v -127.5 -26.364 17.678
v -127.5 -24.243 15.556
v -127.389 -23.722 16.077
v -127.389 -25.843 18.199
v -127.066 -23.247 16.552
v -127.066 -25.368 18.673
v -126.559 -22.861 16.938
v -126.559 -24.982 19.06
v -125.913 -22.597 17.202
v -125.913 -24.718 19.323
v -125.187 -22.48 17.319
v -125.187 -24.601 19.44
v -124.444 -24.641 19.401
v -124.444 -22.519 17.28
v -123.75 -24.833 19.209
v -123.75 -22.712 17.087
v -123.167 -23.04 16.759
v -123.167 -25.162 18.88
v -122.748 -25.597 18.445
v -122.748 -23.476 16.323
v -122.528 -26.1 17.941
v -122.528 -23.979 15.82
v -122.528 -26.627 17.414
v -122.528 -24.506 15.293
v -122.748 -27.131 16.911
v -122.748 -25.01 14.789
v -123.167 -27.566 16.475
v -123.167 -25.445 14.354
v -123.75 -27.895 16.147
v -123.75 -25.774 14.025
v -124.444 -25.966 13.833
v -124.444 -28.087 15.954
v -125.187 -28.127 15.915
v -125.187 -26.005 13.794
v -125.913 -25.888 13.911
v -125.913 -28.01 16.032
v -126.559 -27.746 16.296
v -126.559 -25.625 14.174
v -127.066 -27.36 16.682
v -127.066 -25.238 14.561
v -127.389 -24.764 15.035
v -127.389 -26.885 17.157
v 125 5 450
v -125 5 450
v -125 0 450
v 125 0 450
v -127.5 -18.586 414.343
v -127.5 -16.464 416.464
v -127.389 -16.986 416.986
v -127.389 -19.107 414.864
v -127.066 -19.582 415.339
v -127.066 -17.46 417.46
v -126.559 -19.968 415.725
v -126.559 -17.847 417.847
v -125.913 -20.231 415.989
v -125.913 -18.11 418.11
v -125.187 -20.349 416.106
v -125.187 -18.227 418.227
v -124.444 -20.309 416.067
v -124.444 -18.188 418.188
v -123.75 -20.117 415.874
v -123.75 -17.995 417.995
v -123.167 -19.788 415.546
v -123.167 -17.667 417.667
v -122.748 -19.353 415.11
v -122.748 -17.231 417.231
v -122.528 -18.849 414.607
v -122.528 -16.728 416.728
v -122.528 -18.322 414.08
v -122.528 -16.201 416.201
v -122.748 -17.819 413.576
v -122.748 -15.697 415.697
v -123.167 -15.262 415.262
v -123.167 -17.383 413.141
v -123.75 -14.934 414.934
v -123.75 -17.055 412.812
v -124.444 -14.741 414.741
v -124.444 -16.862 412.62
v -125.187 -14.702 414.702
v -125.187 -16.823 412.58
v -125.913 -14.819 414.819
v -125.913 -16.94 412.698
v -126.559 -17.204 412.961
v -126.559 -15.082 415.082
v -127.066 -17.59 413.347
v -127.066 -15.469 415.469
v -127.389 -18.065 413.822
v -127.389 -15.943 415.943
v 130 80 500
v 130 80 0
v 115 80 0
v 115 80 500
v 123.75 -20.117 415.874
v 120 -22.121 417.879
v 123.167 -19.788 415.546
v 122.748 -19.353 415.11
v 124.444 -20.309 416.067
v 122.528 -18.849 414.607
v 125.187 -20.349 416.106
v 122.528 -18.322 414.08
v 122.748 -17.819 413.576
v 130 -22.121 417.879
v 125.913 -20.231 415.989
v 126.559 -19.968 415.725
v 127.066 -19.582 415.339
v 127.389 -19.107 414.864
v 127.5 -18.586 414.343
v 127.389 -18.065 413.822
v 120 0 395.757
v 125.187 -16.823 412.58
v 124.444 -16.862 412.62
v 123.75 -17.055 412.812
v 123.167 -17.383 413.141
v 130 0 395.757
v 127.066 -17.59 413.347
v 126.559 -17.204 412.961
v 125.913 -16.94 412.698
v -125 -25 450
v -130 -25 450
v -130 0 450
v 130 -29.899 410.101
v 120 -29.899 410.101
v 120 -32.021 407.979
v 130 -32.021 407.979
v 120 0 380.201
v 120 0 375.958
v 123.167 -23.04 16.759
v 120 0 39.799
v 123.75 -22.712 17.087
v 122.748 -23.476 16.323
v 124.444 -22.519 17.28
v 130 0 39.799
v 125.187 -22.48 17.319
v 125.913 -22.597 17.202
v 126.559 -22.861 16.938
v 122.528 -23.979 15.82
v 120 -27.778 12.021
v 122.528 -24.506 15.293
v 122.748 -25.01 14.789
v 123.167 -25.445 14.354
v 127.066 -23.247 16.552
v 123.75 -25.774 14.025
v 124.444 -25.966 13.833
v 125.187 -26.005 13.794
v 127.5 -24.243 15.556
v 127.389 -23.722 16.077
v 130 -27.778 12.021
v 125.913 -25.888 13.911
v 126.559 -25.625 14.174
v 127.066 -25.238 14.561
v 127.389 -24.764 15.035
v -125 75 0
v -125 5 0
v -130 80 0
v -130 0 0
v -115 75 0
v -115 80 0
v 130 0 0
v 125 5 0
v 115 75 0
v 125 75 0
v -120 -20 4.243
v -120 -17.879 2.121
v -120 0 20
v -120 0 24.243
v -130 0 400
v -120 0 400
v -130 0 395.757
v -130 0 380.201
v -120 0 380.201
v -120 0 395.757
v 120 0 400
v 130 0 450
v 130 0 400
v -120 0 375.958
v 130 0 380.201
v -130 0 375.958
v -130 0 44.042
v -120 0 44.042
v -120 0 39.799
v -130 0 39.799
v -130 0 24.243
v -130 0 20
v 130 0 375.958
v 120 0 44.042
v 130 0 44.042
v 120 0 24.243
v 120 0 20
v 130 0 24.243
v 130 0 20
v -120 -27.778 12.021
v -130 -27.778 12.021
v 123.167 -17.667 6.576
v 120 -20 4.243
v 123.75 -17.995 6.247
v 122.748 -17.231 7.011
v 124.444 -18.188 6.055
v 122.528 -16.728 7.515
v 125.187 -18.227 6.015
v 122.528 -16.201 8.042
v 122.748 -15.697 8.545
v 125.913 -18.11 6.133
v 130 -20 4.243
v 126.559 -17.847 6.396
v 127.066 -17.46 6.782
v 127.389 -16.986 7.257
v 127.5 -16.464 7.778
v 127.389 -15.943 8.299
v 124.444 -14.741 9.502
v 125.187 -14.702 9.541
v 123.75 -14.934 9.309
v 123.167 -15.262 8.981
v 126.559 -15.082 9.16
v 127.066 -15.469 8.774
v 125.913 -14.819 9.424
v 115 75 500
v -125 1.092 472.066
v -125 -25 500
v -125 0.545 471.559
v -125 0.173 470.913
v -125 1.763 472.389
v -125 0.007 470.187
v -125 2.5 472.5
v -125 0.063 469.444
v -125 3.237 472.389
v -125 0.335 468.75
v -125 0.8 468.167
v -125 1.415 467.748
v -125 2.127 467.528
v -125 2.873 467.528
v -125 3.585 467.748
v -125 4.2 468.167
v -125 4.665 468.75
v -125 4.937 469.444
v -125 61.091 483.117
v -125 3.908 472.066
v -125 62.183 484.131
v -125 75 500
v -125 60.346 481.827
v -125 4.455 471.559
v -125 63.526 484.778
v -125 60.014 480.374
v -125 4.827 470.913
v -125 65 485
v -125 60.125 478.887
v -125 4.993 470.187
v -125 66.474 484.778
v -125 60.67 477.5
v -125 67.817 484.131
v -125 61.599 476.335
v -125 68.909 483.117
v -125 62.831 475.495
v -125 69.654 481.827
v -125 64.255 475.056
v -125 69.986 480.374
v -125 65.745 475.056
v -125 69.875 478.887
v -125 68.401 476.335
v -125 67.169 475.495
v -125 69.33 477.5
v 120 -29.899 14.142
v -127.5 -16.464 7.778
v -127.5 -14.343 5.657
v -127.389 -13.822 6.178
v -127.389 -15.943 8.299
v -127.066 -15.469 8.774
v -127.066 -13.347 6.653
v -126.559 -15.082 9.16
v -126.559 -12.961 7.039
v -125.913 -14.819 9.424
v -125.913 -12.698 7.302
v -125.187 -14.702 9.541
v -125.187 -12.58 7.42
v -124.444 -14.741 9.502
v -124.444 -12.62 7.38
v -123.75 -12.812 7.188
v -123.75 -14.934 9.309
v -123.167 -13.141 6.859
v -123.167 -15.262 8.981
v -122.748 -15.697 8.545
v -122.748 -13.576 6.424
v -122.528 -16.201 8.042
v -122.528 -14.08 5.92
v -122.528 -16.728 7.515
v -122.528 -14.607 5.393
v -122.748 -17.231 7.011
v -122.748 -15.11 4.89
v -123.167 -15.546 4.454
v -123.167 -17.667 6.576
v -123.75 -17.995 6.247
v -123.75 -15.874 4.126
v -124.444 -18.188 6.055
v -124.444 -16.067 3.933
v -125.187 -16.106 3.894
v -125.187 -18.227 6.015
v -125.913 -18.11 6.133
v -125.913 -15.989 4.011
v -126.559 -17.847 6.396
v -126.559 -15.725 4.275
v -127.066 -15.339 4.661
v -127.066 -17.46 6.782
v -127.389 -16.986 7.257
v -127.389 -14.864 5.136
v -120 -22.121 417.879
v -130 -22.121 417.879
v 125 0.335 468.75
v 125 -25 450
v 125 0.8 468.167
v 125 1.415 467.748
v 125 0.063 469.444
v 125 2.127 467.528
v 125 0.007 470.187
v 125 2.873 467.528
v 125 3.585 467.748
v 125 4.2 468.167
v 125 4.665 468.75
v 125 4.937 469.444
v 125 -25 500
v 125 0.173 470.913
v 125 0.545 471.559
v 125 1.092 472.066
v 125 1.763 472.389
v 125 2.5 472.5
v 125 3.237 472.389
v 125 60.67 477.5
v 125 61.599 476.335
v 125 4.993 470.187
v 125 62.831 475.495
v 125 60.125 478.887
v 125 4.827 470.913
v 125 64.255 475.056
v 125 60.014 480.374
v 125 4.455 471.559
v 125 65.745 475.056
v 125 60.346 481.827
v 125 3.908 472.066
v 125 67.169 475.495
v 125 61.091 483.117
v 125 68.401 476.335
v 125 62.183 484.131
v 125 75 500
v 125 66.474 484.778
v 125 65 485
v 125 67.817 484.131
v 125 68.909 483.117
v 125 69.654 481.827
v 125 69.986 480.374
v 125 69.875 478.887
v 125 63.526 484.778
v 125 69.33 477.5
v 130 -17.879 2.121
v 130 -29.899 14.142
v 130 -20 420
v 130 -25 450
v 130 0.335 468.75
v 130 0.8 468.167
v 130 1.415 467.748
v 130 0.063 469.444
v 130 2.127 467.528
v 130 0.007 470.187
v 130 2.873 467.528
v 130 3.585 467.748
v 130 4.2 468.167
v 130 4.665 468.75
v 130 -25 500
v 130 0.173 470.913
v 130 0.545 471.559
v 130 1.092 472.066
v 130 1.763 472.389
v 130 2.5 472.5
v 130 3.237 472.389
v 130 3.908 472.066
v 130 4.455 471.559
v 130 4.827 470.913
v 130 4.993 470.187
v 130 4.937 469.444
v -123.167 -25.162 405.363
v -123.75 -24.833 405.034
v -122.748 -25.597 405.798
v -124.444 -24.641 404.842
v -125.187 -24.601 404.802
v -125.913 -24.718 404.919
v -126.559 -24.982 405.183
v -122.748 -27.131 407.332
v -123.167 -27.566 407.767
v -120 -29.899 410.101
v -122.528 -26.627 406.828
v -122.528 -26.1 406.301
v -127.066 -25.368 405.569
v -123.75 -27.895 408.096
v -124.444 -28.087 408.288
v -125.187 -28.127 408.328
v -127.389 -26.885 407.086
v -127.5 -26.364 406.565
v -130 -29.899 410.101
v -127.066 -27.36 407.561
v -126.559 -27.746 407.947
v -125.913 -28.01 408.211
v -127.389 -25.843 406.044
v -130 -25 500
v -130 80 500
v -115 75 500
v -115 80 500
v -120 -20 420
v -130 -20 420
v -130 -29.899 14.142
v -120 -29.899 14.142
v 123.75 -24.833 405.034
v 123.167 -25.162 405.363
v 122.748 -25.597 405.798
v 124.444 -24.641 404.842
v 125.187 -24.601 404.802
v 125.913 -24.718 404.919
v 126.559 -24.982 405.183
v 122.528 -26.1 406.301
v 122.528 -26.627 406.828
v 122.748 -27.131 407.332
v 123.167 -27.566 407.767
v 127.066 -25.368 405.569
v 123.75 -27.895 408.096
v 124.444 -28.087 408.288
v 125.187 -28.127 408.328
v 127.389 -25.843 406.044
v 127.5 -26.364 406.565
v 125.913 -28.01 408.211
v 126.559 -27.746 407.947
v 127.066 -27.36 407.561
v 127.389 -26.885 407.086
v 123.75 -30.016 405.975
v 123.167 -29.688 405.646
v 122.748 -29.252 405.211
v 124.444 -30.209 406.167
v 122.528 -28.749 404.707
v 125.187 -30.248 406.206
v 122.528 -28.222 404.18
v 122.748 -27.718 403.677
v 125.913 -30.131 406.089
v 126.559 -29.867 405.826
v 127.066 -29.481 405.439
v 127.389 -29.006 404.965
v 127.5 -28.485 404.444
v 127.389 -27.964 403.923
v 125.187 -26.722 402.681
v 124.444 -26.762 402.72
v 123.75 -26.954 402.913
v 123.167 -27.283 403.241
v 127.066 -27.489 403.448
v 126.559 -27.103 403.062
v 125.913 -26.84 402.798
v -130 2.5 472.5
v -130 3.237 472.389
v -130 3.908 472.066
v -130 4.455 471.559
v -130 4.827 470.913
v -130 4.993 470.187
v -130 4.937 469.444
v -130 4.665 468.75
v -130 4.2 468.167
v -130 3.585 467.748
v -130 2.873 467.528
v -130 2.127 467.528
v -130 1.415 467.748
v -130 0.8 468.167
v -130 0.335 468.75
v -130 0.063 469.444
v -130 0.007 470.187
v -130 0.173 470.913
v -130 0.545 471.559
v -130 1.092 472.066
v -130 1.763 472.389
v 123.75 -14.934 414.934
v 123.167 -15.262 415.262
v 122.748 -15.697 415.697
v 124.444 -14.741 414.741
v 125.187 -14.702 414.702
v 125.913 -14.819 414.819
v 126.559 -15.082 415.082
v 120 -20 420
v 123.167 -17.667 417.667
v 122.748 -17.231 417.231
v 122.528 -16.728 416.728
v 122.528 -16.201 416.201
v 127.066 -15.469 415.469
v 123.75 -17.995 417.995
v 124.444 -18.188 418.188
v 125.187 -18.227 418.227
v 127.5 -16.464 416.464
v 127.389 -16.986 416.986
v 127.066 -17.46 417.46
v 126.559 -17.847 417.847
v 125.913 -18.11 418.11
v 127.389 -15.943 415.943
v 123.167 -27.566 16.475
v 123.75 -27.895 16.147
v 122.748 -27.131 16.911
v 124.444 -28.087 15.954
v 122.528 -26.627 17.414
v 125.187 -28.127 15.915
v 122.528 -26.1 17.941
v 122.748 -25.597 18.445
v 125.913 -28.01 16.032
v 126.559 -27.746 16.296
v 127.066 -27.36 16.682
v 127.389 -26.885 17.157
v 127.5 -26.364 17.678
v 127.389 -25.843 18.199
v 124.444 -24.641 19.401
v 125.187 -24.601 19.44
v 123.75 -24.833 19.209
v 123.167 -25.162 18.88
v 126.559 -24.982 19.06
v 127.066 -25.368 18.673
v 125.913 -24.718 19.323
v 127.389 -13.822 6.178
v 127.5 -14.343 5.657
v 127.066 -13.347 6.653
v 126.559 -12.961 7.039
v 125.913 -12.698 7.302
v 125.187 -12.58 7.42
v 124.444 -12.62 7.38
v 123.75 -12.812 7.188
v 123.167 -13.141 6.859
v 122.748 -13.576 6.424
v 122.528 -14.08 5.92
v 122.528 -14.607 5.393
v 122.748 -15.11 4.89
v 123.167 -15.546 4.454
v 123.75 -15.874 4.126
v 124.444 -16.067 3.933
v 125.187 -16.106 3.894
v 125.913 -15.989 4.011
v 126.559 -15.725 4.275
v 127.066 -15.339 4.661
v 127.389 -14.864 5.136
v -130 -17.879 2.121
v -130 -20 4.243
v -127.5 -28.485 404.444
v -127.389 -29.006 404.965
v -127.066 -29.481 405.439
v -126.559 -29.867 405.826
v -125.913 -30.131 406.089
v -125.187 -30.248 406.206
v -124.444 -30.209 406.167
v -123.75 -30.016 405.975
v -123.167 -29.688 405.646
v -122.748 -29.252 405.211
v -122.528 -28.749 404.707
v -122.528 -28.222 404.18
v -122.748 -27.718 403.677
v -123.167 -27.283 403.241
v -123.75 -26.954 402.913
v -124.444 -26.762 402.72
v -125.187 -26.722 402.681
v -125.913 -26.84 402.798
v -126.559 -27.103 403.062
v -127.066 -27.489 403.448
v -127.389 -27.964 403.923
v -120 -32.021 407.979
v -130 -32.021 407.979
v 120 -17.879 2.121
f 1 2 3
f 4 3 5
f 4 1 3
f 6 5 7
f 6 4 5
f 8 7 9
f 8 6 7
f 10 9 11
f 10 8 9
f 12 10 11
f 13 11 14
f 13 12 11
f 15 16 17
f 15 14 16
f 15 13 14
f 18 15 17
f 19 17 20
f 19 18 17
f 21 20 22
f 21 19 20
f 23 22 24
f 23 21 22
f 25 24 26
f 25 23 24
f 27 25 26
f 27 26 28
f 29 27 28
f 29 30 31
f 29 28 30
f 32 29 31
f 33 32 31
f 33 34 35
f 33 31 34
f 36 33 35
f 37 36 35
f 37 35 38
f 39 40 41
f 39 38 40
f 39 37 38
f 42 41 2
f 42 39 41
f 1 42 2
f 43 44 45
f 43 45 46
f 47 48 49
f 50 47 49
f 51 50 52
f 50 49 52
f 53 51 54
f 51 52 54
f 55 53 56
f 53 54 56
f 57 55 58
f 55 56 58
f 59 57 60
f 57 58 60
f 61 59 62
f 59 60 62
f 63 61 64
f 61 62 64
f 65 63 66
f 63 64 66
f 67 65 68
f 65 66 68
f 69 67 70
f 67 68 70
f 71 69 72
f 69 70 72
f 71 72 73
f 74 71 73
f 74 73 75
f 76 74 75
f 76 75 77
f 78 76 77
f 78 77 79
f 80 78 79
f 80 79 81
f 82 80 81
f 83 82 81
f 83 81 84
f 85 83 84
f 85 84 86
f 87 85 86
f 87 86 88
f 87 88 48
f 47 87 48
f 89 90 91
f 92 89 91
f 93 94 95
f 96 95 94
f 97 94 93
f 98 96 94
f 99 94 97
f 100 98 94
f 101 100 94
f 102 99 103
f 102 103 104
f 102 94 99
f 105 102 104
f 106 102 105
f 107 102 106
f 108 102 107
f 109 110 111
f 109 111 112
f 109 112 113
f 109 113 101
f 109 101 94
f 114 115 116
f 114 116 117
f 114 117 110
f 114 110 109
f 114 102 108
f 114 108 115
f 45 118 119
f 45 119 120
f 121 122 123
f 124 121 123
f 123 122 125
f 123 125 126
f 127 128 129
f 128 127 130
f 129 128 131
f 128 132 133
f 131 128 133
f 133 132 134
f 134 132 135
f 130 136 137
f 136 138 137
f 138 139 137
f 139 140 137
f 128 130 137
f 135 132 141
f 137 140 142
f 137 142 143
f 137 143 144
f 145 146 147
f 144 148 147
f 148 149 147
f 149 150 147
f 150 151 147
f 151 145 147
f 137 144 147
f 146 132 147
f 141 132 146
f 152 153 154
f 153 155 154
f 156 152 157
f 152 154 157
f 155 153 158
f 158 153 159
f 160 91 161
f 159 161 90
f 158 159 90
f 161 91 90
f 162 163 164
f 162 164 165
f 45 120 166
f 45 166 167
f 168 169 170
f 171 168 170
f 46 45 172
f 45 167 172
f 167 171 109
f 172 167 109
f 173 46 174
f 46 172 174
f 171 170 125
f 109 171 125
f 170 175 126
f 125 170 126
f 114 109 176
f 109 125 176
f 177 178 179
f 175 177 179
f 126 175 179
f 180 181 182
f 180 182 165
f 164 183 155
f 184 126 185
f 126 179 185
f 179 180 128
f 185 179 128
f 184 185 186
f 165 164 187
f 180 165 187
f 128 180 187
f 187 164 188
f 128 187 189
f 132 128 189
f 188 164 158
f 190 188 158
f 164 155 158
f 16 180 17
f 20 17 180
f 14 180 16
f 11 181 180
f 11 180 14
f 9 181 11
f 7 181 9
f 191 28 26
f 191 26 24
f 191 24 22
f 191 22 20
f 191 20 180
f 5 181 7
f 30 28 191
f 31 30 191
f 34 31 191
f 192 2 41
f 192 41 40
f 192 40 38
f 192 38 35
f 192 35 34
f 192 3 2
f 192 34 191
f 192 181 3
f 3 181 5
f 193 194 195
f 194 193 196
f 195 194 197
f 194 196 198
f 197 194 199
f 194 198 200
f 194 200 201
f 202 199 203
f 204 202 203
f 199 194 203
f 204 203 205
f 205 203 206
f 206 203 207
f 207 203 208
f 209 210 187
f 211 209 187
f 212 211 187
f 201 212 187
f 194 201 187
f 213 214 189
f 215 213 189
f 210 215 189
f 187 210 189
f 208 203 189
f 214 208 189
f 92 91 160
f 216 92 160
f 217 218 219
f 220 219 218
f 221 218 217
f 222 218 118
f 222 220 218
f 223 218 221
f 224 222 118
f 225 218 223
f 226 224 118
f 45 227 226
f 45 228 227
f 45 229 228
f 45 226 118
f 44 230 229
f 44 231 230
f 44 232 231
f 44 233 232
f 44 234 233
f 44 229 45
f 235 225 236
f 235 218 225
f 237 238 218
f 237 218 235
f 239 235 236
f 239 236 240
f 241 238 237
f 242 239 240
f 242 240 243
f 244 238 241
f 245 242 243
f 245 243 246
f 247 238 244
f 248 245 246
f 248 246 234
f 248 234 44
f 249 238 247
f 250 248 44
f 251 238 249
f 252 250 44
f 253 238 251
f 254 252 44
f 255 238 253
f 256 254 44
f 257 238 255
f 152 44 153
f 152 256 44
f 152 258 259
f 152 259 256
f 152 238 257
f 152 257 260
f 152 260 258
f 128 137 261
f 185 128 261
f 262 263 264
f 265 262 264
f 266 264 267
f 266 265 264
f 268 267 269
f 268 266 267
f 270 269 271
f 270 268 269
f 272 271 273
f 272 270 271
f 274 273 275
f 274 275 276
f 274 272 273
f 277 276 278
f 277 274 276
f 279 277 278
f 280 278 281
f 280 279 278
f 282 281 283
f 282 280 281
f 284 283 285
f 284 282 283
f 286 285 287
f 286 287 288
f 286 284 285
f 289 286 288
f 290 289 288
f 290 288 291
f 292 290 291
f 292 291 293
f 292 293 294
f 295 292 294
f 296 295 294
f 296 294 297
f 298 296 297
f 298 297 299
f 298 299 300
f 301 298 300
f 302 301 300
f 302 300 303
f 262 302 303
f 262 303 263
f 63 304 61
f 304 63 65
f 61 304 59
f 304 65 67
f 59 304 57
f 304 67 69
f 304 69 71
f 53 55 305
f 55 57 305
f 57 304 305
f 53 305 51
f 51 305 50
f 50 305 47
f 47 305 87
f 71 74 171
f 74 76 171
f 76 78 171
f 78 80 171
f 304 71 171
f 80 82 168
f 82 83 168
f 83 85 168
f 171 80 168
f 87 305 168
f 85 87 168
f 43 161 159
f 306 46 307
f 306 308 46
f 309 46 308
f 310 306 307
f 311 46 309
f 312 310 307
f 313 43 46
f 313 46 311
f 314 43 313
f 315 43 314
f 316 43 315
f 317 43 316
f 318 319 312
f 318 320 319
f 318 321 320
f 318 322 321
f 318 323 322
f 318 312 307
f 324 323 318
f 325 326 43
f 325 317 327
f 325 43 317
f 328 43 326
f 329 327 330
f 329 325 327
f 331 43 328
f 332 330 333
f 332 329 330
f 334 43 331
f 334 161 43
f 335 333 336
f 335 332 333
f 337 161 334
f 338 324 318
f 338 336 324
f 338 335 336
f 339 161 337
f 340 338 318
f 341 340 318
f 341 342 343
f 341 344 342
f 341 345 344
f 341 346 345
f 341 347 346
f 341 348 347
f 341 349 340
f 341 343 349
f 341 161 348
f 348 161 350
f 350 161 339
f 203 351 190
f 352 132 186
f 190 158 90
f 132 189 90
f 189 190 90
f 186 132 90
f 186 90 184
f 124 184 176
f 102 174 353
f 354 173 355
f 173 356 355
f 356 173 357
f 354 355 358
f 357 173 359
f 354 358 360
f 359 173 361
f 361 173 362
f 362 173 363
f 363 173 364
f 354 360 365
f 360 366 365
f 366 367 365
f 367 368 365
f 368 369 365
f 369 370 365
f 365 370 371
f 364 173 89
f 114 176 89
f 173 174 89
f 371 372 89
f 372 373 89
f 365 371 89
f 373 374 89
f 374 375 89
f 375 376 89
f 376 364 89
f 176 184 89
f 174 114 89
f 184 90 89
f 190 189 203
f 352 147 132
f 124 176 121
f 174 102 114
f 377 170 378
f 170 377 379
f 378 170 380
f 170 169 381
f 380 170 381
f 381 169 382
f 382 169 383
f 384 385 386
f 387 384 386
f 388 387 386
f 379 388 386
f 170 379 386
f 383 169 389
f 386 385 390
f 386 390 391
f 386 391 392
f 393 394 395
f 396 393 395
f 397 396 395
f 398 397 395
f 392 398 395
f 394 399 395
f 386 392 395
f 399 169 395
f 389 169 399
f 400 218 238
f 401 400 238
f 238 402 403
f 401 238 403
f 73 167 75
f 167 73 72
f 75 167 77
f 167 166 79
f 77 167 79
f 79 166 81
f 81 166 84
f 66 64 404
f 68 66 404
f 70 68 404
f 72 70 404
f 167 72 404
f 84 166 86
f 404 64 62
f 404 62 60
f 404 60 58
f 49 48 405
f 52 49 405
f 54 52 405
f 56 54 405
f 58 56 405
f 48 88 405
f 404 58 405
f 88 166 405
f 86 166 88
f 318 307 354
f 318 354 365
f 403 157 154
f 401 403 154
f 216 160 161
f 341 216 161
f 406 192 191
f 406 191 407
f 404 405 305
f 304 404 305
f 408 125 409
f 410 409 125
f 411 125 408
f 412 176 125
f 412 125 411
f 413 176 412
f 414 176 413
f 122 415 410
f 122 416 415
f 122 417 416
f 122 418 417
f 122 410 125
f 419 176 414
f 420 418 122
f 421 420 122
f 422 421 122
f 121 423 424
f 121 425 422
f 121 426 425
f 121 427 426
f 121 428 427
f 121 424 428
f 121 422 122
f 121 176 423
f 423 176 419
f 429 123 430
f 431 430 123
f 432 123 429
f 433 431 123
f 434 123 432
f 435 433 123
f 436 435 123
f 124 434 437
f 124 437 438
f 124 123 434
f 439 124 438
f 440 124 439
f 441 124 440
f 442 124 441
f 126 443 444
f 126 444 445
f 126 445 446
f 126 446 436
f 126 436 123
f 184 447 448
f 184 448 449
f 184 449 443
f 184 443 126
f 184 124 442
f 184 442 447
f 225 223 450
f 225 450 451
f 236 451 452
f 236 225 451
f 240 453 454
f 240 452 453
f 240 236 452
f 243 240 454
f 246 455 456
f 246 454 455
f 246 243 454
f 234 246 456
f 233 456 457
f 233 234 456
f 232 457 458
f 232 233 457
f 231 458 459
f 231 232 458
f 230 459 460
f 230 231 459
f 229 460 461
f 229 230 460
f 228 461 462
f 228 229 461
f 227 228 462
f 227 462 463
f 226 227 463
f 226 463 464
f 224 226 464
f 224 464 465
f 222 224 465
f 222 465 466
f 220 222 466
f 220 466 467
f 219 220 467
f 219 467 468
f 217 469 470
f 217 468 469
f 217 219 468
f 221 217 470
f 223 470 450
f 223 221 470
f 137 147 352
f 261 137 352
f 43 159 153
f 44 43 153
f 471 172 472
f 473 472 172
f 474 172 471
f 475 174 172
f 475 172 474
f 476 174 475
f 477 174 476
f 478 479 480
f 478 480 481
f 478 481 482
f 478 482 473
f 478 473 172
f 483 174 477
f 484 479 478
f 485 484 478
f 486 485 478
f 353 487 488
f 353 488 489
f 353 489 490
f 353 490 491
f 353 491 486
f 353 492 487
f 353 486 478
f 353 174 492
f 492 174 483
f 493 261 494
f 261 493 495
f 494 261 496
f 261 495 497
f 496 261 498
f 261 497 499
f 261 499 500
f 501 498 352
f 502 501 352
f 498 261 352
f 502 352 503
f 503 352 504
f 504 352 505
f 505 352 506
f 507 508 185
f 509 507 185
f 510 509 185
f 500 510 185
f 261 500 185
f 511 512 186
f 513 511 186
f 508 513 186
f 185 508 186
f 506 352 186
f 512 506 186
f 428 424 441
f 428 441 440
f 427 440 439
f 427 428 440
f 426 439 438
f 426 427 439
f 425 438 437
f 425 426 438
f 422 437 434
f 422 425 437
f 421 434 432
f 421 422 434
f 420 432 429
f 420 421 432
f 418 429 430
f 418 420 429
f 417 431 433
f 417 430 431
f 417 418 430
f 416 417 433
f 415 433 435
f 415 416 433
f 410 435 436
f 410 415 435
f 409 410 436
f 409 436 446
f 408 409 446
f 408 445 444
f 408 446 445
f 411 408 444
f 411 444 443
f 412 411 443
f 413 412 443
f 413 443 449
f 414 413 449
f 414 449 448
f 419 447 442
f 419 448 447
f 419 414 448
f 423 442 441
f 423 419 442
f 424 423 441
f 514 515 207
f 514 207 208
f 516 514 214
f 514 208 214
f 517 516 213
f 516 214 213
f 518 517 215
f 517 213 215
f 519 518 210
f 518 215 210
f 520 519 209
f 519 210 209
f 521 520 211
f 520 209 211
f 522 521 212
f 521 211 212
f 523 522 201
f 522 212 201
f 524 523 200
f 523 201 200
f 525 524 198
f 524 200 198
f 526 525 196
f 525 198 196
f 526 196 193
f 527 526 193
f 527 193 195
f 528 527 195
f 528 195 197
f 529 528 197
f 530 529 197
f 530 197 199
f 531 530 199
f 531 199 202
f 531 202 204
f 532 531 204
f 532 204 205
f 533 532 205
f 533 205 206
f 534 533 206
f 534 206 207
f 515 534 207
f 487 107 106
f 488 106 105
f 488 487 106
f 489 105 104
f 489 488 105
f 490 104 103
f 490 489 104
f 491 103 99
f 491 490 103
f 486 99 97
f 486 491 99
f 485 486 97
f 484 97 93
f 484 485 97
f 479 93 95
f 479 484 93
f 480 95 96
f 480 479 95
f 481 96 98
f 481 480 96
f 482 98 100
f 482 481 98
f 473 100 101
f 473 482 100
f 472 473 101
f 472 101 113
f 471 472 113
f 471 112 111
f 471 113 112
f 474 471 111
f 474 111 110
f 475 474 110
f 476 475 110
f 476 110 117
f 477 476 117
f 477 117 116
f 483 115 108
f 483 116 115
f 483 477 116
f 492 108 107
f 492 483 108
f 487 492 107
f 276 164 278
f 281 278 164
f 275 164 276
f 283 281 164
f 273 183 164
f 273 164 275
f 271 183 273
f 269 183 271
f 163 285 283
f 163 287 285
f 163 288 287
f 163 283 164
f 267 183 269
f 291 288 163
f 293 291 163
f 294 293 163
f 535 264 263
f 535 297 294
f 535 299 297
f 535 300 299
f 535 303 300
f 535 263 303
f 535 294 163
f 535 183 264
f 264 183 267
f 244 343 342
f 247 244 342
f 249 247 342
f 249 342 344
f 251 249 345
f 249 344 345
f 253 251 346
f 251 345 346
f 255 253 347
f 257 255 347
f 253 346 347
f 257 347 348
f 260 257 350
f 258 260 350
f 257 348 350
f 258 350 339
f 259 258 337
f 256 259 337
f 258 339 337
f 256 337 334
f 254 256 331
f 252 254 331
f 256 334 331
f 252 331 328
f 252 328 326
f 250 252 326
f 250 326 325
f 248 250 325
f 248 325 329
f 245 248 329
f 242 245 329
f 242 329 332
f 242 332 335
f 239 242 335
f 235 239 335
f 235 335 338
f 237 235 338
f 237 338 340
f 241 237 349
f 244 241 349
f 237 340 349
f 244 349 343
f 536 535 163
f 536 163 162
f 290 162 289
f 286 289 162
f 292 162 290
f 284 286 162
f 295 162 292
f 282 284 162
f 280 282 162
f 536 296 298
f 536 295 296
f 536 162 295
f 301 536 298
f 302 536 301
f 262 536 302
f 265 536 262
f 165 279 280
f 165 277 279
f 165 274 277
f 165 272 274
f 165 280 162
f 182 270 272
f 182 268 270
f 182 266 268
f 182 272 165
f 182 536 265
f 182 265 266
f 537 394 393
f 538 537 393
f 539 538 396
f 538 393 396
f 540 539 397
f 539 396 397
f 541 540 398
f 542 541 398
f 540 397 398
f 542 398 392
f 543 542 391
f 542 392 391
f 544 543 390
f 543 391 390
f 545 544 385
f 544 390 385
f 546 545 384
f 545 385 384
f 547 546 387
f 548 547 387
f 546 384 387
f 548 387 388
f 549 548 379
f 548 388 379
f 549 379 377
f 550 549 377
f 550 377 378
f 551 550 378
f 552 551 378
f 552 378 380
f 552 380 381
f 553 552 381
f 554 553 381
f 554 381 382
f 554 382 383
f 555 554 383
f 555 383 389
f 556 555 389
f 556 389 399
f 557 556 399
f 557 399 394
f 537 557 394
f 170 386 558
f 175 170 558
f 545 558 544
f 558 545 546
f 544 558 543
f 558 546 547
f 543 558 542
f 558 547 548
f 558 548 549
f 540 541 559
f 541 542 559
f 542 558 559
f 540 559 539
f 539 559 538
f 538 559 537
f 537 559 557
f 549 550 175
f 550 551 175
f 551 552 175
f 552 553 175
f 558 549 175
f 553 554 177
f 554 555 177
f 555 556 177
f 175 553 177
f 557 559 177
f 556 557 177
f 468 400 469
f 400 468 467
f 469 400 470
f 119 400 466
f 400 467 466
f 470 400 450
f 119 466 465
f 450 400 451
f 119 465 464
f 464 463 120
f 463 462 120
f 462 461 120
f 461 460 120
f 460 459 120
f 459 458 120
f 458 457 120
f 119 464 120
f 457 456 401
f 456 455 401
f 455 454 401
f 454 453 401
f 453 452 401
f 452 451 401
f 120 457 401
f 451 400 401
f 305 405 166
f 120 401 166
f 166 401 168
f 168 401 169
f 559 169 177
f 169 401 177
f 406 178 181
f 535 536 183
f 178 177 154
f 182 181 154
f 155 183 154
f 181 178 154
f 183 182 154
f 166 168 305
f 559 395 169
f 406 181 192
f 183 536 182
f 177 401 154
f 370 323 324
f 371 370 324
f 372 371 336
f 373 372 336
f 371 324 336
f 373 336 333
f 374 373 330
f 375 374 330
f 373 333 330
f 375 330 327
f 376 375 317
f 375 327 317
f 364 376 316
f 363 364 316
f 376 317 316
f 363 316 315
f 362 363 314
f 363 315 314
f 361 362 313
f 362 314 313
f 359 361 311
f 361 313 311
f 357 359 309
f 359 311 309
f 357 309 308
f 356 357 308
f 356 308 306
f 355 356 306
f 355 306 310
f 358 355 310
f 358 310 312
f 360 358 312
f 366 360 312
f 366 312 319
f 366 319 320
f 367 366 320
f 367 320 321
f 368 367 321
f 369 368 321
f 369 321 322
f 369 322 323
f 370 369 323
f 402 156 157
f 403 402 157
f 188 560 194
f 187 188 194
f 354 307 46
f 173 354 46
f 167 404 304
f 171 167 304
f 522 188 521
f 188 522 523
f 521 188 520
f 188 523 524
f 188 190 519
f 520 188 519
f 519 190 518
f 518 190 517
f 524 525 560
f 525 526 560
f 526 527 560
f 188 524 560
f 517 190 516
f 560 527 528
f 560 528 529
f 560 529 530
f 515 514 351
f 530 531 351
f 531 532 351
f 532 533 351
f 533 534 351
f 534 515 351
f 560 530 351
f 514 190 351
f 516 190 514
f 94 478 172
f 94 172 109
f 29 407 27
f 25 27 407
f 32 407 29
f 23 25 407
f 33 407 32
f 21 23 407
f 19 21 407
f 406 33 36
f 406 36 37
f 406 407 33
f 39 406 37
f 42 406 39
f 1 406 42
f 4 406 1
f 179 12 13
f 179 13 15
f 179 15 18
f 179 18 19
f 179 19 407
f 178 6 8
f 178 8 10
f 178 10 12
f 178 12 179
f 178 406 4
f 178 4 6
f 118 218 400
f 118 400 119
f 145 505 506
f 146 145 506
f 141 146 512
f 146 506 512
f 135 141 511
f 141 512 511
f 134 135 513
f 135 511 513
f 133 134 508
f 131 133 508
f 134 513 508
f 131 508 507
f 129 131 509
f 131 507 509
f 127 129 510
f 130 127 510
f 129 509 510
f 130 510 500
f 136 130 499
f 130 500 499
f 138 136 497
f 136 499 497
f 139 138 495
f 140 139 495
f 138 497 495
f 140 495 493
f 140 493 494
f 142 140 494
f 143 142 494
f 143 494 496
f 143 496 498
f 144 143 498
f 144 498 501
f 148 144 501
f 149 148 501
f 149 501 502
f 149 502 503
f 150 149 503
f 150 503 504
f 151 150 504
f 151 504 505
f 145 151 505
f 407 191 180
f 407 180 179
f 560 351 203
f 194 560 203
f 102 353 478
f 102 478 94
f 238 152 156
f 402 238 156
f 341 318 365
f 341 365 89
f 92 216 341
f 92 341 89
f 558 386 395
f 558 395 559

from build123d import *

# Parameters (mm, degrees)
BOSS_EXTRUDE2_DEPTH     = 500
SKETCH3_W               = 250
SKETCH3_H               = 50
CUT_EXTRUDE1_DEPTH      = 6
SKETCH5_W               = 50
SKETCH5_H               = 25
BOSS_EXTRUDE3_DEPTH     = 5
SKETCH7_W               = 50
SKETCH7_H               = 25
BOSS_EXTRUDE4_DEPTH     = 5
SKETCH8_R               = 2.5
CUT_EXTRUDE4_DEPTH      = 256
CUT_EXTRUDE4_DEPTH_BACK = 6
SKETCH11_R              = 5
BOSS_EXTRUDE15_DEPTH    = 250
BOSS_EXTRUDE16_DEPTH    = 10
BOSS_EXTRUDE17_DEPTH    = 10
CUT_EXTRUDE5_START      = -17
SKETCH30_R              = 2.5
CUT_EXTRUDE5_DEPTH      = 306.484848098
SKETCH31_R              = 2.5
CUT_EXTRUDE6_DEPTH      = 17


with BuildPart() as part:
    # Sketch2 → Boss-Extrude2 (new body)
    with BuildSketch(Plane.XY):
        Polygon((-130, 0), (130, 0), (130, 80), (115, 80), (115, 75), (125, 75), (125, 5), (-125, 5), (-125, 75), (-115, 75), (-115, 80), (-130, 80), align=None)
    extrude(amount=BOSS_EXTRUDE2_DEPTH)

    # Sketch3 → Cut-Extrude1 (cut, through all)
    with BuildSketch(Plane(origin=(0, 5, 0), x_dir=(1, 0, 0), z_dir=(0, 1, 0))):
        with Locations((0, -475)):
            Rectangle(SKETCH3_W, SKETCH3_H)
    extrude(amount=-CUT_EXTRUDE1_DEPTH, mode=Mode.SUBTRACT)

    # Sketch5 → Boss-Extrude3 (add)
    with BuildSketch(Plane.ZY.offset(-125)):
        with Locations((475, -12.5)):
            Rectangle(SKETCH5_W, SKETCH5_H)
    extrude(amount=-BOSS_EXTRUDE3_DEPTH)

    # Sketch7 → Boss-Extrude4 (add)
    with BuildSketch(Plane(origin=(-125, 0, 0), x_dir=(0, 0, -1), z_dir=(1, 0, 0))):
        with Locations((-475, -12.5)):
            Rectangle(SKETCH7_W, SKETCH7_H)
    extrude(amount=-BOSS_EXTRUDE4_DEPTH)

    # Sketch8 → Cut-Extrude4 (cut, two sides)
    with BuildSketch(Plane.ZY.offset(-125)) as cut_extrude4_sk:
        with Locations((470, 2.5)):
            Circle(SKETCH8_R)
    extrude(amount=CUT_EXTRUDE4_DEPTH, mode=Mode.SUBTRACT)
    extrude(cut_extrude4_sk.sketch, amount=-CUT_EXTRUDE4_DEPTH_BACK, mode=Mode.SUBTRACT)

    # Sketch11 → Boss-Extrude15 (add)
    with BuildSketch(Plane.ZY.offset(-125)):
        with Locations((480, 65)):
            Circle(SKETCH11_R)
    extrude(amount=BOSS_EXTRUDE15_DEPTH)

    # Sketch27 → Boss-Extrude16 (add)
    with BuildSketch(Plane(origin=(130, 0, 0), x_dir=(0, 0, -1), z_dir=(1, 0, 0))):
        Polygon((-20, 0), (-2.121320344, -17.878679656), (-4.242640687, -20), (-24.242640687, 0), align=None)
        Polygon((-39.798989873, 0), (-12.02081528, -27.778174593), (-14.142135624, -29.899494937), (-44.04163056, 0), align=None)
    boss_extrude16 = extrude(amount=-BOSS_EXTRUDE16_DEPTH)

    # Mirror1: Boss-Extrude16 across plane
    add(boss_extrude16.mirror(Plane.ZY))

    # Sketch29 → Boss-Extrude17 (add)
    with BuildSketch(Plane(origin=(130, 0, 0), x_dir=(0, 0, -1), z_dir=(1, 0, 0))):
        Polygon((-400, 0), (-420, -20), (-417.878679656, -22.121320344), (-395.757359313, 0), align=None)
        Polygon((-380.201010127, 0), (-410.100505063, -29.899494937), (-407.97918472, -32.02081528), (-375.95836944, 0), align=None)
    boss_extrude17 = extrude(amount=-BOSS_EXTRUDE17_DEPTH)

    # Mirror2: Boss-Extrude17 across plane
    add(boss_extrude17.mirror(Plane.ZY))

    # Sketch30 → Cut-Extrude5 (cut)
    with BuildSketch(Plane(origin=(0, 187.97918472, 187.97918472), x_dir=(1, 0, 0), z_dir=(0, -0.707106781, -0.707106781)).offset(CUT_EXTRUDE5_START)):
        with Locations((125, 306.126983722)):
            Circle(SKETCH30_R)
    cut_extrude5 = extrude(amount=CUT_EXTRUDE5_DEPTH, mode=Mode.SUBTRACT)

    # Mirror3: Cut-Extrude5 across plane
    add(cut_extrude5.mirror(Plane.ZY), mode=Mode.SUBTRACT)

    # Sketch31 → Cut-Extrude6 (cut)
    with BuildSketch(Plane(origin=(0, -22.02081528, 22.02081528), x_dir=(1, 0, 0), z_dir=(0, -0.707106781, 0.707106781))):
        with Locations((125, -6.142135624)):
            Circle(SKETCH31_R)
    cut_extrude6 = extrude(amount=-CUT_EXTRUDE6_DEPTH, mode=Mode.SUBTRACT)

    # Mirror5: Cut-Extrude6 across plane
    add(cut_extrude6.mirror(Plane.ZY), mode=Mode.SUBTRACT)


solid = part.part
